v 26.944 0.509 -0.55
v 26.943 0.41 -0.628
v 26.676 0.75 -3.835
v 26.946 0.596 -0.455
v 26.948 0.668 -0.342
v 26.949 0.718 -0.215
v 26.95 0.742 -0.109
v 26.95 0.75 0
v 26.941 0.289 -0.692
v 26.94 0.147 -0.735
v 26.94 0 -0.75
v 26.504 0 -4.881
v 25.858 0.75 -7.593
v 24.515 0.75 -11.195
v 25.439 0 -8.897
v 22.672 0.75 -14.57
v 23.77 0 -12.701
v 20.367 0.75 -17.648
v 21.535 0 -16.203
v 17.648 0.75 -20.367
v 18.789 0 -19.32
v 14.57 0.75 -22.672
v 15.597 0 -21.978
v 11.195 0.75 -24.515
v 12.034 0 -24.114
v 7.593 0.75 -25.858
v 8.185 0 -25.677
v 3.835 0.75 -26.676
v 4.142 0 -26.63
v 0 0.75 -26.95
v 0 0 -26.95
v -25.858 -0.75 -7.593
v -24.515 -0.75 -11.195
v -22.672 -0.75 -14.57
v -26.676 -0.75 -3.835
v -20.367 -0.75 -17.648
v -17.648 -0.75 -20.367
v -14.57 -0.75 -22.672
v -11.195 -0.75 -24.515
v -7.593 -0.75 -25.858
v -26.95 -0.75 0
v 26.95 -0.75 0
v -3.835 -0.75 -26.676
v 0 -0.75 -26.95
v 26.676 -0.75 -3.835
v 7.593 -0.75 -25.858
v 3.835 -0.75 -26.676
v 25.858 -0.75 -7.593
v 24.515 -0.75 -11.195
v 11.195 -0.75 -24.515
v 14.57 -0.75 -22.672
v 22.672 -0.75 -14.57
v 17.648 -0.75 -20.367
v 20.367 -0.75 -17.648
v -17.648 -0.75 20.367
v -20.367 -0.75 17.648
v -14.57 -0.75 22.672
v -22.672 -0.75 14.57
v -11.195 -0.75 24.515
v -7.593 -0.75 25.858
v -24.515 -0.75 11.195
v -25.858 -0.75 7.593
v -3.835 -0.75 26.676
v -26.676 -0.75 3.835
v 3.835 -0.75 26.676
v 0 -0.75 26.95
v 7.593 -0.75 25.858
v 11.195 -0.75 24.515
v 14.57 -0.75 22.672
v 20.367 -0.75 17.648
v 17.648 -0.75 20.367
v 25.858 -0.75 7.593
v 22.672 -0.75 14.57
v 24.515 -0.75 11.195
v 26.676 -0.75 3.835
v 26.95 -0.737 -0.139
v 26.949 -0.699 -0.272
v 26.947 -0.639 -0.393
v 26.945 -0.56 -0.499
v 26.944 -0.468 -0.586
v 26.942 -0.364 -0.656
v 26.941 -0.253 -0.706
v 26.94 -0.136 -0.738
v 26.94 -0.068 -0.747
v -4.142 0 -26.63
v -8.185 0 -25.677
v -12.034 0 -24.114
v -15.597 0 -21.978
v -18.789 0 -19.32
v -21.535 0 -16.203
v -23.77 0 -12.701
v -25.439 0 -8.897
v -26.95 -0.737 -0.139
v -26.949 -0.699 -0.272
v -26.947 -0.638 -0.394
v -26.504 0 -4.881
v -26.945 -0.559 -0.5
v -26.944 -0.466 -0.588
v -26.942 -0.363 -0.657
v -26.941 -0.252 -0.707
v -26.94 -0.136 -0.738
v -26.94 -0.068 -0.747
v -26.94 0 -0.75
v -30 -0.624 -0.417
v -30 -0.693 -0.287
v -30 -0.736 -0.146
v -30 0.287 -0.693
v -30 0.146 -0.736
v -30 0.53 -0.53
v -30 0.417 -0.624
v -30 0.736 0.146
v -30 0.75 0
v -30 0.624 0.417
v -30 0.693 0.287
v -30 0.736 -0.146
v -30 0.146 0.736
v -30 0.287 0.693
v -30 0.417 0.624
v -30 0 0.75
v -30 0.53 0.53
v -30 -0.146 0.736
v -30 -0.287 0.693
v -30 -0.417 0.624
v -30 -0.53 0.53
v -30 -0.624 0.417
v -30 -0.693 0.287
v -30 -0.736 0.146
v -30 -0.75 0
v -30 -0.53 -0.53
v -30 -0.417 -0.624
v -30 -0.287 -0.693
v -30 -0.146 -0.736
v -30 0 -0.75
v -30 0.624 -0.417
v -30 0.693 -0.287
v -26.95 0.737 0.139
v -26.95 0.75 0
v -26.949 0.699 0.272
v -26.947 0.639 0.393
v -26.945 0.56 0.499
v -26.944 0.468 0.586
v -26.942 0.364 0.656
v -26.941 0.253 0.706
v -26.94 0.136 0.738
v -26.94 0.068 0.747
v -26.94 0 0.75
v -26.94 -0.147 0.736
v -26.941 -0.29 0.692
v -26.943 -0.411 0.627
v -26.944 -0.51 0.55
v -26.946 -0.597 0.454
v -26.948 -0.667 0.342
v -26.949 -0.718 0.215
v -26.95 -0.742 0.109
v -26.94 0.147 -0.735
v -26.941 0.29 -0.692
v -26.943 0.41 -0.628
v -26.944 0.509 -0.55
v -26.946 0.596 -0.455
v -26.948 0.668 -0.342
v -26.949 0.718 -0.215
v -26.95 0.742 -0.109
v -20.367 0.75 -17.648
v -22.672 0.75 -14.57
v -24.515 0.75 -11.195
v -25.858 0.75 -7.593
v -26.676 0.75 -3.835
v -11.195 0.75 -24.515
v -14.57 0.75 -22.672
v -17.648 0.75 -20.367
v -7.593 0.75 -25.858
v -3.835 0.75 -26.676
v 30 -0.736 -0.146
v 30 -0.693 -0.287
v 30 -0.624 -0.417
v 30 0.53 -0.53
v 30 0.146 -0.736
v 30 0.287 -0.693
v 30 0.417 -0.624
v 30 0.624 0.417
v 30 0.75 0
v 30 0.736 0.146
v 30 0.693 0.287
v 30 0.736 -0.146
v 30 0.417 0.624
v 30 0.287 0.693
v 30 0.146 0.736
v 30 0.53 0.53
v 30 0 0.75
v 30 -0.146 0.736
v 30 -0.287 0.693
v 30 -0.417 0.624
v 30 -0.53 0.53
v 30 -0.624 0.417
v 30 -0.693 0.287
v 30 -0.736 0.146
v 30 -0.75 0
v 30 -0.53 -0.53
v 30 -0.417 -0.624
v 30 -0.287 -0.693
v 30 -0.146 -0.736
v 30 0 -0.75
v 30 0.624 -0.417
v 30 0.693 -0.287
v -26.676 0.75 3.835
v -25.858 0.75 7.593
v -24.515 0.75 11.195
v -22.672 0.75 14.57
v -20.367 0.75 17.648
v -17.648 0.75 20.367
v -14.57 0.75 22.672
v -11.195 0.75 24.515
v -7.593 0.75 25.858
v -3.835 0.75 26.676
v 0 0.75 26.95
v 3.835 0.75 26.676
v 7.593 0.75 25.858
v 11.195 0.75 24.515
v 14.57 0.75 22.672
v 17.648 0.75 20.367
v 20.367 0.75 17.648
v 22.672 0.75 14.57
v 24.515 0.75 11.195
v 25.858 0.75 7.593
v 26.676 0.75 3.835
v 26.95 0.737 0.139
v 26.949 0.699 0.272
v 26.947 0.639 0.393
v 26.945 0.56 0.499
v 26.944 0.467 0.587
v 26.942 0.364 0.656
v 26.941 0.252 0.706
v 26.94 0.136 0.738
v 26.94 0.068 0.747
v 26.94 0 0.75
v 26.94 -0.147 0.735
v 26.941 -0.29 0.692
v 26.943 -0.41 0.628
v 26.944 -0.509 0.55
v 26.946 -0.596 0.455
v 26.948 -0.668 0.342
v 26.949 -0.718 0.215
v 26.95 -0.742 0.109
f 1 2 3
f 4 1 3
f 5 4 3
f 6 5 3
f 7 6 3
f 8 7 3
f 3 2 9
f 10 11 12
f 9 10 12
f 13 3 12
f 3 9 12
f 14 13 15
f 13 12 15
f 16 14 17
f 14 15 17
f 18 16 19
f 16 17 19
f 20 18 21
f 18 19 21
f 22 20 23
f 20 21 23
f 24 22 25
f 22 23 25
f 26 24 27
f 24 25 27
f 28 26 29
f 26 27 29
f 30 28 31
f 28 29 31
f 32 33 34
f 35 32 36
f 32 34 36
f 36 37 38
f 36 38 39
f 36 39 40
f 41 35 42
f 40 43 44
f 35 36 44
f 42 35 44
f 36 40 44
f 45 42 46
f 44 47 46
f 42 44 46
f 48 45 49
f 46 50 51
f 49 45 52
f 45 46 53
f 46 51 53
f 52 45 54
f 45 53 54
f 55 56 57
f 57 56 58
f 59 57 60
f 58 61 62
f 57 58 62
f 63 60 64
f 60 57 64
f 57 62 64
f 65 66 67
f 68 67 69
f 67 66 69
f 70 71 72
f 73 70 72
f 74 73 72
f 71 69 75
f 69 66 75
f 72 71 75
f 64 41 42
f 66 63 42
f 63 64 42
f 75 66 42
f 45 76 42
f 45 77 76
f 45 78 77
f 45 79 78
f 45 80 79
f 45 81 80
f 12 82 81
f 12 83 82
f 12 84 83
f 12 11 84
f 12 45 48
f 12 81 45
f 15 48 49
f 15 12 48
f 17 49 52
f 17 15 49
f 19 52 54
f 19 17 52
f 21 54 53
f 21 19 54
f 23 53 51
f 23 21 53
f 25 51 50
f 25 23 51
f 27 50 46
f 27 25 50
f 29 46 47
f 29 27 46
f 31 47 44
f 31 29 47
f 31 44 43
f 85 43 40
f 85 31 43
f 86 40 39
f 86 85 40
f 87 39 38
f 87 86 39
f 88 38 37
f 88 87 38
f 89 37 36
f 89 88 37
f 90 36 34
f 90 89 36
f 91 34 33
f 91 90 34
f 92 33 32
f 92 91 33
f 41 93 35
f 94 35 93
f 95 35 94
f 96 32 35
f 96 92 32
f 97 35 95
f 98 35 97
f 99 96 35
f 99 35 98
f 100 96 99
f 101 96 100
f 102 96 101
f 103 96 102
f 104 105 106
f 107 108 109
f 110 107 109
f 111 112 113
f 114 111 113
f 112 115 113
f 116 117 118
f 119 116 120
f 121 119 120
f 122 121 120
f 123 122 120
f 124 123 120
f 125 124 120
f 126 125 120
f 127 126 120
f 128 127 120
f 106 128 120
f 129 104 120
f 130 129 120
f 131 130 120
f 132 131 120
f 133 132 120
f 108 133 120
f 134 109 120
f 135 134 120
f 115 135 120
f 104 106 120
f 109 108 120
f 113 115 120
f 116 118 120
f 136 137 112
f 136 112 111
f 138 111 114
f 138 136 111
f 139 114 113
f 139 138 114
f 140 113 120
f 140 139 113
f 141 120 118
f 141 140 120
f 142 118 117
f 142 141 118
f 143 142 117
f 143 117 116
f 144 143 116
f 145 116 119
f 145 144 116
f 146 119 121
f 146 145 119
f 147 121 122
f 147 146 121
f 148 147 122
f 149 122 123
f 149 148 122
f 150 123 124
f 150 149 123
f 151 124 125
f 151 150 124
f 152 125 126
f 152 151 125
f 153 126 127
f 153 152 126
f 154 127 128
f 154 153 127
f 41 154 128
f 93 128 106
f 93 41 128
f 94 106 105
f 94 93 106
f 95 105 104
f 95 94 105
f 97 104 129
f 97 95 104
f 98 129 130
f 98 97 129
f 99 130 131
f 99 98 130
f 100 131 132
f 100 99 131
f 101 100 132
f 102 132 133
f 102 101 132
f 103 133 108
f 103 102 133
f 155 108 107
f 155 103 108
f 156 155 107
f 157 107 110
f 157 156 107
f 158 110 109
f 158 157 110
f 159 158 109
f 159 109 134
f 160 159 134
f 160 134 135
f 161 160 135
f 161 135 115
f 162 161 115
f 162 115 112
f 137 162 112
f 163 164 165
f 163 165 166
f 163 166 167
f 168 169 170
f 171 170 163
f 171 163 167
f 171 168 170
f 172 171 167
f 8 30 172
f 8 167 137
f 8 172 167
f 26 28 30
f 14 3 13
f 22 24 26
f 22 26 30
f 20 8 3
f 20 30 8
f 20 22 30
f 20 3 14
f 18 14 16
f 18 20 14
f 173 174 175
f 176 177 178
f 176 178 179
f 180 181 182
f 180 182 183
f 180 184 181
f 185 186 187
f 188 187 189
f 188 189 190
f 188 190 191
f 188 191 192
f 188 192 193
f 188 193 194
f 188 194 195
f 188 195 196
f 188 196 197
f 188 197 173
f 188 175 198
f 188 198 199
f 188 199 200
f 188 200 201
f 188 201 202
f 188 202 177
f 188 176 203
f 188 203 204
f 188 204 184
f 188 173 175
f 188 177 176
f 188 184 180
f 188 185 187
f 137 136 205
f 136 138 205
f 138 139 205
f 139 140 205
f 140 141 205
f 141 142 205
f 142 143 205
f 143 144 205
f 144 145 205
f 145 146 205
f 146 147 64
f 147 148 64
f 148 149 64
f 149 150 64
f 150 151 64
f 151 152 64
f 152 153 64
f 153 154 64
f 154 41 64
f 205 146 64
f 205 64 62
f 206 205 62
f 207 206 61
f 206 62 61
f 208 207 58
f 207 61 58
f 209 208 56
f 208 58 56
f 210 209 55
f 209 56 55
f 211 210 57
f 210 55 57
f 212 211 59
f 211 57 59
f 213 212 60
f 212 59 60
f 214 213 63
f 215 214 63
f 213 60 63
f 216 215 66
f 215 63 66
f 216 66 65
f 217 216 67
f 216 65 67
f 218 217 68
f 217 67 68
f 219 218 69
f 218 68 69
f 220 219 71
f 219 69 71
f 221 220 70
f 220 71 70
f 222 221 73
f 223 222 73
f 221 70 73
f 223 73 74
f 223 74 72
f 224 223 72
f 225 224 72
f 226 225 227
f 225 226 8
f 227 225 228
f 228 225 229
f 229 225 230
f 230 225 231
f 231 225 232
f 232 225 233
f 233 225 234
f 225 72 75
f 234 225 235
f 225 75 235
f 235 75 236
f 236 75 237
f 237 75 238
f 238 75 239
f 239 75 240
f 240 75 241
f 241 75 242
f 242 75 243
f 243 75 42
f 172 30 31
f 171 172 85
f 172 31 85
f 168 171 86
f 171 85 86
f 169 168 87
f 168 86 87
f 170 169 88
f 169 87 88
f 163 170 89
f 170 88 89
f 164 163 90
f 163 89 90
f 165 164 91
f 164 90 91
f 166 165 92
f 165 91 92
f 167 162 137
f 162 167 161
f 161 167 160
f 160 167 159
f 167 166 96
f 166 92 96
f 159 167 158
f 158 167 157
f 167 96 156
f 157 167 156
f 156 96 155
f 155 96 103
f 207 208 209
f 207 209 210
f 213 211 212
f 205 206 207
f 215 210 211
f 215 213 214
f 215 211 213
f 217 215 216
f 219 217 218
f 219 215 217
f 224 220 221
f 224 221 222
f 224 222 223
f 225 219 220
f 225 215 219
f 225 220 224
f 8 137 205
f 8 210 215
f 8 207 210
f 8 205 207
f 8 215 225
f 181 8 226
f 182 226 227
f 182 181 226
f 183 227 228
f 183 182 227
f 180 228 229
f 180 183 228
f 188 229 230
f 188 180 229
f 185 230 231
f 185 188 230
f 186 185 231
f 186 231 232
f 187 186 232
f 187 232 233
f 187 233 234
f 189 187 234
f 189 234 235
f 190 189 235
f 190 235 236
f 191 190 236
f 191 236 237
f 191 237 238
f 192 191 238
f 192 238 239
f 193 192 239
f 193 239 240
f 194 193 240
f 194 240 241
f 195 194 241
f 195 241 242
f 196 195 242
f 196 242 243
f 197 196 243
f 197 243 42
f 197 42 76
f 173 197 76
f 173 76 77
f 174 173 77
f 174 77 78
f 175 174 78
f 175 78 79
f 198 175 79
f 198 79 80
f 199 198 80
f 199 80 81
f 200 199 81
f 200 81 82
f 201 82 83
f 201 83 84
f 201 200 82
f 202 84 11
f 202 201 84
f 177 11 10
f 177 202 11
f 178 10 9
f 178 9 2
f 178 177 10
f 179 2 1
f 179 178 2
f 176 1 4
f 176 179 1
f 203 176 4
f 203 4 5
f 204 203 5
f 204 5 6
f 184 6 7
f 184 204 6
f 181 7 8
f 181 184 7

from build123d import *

# Parameters (mm, degrees)
BOSS_EXTRUDE3_DEPTH = 0.75
SKETCH6_R           = 0.75
BOSS_EXTRUDE4_DEPTH = 30


with BuildPart() as part:
    # Sketch2 → Boss-Extrude3 (new, symmetric)
    with BuildSketch(Plane(origin=(0, 0, 0), x_dir=(1, 0, 0), z_dir=(0, 1, 0))):
        with BuildLine():
            ThreePointArc((26.95, 0), (19.056527753, 19.056527753), (0, 26.95))
            Line((0, 26.95), (0, -26.95))
            ThreePointArc((0, -26.95), (19.056527753, -19.056527753), (26.95, 0))
        make_face()
        with BuildLine():
            Line((0, -26.95), (0, 26.95))
            ThreePointArc((0, 26.95), (-26.95, 0), (0, -26.95))
        make_face()
    extrude(amount=BOSS_EXTRUDE3_DEPTH, both=True)

    # Sketch6 → Boss-Extrude4 (add, symmetric)
    with BuildSketch(Plane(origin=(0, 0, 0), x_dir=(0, 0, -1), z_dir=(1, 0, 0))):
        with Locations(Location((0, 0, 0), (0, 0, 90))):
            Circle(SKETCH6_R)
    extrude(amount=BOSS_EXTRUDE4_DEPTH, both=True)


solid = part.part
